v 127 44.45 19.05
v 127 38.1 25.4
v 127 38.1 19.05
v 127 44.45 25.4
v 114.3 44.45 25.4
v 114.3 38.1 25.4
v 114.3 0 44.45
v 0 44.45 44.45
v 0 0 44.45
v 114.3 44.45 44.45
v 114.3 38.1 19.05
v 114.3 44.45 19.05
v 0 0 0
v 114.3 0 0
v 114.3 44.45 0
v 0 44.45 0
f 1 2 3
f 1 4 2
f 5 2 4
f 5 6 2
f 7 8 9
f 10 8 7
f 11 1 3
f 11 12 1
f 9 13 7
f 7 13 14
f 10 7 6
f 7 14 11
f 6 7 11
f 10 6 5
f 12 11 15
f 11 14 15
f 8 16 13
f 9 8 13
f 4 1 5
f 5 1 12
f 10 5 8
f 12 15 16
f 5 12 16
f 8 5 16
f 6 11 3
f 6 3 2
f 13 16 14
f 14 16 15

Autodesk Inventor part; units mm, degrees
ref_plane "YZ Plane" through (0, 0, 0) normal (1, 0, 0) x (0, 1, 0)
ref_plane "XZ Plane" through (0, 0, 0) normal (0, 1, 0) x (-1, 0, 0)
ref_plane "XY Plane" through (0, 0, 0) normal (0, 0, 1) x (1, 0, 0)
sketch "Sketch1" plane through (0, 0, 0) normal (0, 0, 1) x (1, 0, 0)
  line L0 (0, 0) -> (114.3, 0)
  line L1 (114.3, 0) -> (114.3, 44.45)
  line L2 (114.3, 44.45) -> (0, 44.45)
  line L3 (0, 44.45) -> (0, 0)
  dimension "d0" = 114.3
  dimension "d1" = 44.45
extrude "Extrusion1" add sketch "Sketch1" along normal blind 44.45
sketch "Sketch2" plane through (114.3, 0, 0) normal (1, 0, 0) x (0, 0, -1)
  line L0 (0, 44.45) -> (-44.45, 44.45) projected
  line L1 (-25.4, 44.45) -> (-19.05, 44.45)
  line L2 (-19.05, 44.45) -> (-19.05, 38.1)
  line L3 (-19.05, 38.1) -> (-25.4, 38.1)
  line L4 (-25.4, 38.1) -> (-25.4, 44.45)
  line L5 (-44.45, 0) -> (-44.45, 44.45) projected
  line L6 (0, 0) -> (0, 44.45) projected
  dimension "d4" = 19.05
  dimension "d5" = 19.05
  dimension "d6" = 6.35
  dimension "d7" = 6.35
extrude "Extrusion2" add sketch "Sketch2" along normal blind 12.7
properties part number "batery" material "Rubber"
